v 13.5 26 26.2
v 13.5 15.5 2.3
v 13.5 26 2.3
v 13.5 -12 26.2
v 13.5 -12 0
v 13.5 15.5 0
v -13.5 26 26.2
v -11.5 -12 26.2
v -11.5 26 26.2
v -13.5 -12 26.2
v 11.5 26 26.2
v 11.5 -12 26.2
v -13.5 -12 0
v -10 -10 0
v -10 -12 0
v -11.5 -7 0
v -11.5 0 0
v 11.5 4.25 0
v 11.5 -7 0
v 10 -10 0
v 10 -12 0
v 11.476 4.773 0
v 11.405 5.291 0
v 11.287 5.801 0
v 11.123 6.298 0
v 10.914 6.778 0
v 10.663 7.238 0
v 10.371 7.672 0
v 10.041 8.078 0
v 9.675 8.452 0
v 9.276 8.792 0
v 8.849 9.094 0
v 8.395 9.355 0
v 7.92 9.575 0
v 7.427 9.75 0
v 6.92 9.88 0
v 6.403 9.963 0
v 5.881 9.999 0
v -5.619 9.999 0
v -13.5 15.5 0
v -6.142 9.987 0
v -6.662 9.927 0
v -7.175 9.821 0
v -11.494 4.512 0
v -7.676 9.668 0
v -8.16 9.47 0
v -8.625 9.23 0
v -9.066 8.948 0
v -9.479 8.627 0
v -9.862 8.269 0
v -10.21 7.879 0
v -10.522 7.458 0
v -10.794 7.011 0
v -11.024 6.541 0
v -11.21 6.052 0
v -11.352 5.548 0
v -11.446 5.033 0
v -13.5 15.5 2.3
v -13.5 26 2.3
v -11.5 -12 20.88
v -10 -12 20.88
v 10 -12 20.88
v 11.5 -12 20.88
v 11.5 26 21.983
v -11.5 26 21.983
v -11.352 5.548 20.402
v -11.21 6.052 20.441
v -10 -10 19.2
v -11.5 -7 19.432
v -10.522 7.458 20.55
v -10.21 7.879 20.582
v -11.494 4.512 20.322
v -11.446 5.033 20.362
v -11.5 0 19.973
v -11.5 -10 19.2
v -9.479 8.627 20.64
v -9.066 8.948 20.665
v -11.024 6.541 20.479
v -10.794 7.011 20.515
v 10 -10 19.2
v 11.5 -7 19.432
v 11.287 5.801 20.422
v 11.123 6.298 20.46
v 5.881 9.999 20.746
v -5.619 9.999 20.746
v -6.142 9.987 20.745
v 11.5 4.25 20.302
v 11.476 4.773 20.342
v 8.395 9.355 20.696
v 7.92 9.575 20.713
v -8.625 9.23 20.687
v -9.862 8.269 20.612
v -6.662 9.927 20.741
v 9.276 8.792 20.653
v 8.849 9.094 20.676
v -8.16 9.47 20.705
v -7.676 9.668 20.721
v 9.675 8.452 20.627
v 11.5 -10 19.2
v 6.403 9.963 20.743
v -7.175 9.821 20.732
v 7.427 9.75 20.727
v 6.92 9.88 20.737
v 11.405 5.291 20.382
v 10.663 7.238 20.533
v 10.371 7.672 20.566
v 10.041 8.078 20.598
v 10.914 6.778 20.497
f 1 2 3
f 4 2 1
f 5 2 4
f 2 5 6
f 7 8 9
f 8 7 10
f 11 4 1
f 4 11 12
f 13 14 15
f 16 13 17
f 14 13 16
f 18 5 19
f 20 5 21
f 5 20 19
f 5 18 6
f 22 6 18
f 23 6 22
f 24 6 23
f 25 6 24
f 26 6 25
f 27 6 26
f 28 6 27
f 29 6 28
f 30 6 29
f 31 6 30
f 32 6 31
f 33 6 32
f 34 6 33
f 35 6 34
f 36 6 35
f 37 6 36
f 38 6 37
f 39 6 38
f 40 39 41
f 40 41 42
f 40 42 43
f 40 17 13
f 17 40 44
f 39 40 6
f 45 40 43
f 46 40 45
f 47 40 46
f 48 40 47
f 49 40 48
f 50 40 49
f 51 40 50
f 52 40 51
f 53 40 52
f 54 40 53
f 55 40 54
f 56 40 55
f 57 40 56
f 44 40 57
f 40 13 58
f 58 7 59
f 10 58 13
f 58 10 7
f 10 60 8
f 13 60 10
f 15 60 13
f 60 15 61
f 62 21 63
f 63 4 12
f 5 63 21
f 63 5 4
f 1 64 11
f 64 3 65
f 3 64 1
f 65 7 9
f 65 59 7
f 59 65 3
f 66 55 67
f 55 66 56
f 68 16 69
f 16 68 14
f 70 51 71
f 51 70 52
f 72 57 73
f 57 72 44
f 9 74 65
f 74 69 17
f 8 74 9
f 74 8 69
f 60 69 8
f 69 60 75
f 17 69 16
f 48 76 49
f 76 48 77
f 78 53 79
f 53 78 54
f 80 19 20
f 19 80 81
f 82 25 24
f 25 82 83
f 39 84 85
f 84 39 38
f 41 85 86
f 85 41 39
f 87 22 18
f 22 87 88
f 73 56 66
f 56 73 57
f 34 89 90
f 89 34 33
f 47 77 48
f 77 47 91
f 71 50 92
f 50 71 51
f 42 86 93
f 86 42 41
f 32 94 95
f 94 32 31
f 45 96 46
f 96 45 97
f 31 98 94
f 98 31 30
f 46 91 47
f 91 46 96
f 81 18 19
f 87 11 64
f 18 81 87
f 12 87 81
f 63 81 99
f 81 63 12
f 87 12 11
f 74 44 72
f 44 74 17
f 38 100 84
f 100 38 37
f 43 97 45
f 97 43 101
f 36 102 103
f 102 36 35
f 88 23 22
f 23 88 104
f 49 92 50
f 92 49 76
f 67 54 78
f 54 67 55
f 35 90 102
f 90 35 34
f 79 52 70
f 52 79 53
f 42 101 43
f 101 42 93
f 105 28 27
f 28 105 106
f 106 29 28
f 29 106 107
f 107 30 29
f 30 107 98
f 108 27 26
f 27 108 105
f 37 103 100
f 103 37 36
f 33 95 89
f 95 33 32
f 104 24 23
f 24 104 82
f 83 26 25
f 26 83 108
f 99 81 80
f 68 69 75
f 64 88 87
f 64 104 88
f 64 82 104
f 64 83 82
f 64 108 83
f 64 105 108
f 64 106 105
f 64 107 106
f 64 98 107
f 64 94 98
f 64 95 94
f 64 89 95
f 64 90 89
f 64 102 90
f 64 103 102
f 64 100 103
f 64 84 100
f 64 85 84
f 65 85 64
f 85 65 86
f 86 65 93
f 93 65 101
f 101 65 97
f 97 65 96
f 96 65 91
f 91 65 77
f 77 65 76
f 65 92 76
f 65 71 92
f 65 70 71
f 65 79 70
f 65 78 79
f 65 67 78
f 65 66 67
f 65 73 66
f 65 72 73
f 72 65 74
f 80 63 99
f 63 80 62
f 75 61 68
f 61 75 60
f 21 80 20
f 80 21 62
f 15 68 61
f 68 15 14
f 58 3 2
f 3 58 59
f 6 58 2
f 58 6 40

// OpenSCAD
module shape(size,top) {
   hull() {
        translate([0,0,size.z/2]) {
            _radius = size.x/4;
            _diameter = 2*_radius;
            for(side = [-1,1]) {
                translate(
                    [
                        side*(size.x-3*_radius),
                        size.y/2-_radius,
                        0
                    ]
                ) {
                    $fn = 12*_radius;
                    cylinder(h=size.z,r=_radius,center=true);
                }
            }
            
            _distance_x = 1.5;
            translate([0,size.y/-4,0]) {
                cube([size.x-2*_distance_x,size.y/2,size.z],center=true);
            }
            _distance_y = 3;
            translate([0,size.y/-4+_distance_y/2,0]) {
                cube([size.x,size.y/2-_distance_y,size.z],center=true);
            }
        }
    }
    
    _dy = top.y/2+size.y/2;
   
    hull() {
        translate([0,0,2*size.z+top.z/2]) {
            cube([size.x,4*size.y,top.z],center = true);
        }
        translate([0,-size.y/2,size.z-top.z]) {
            rotate([4.4209072801,0,0]) {
                translate([0,_dy,top.z/2]) {
                    cube([size.x,size.y+top.y,top.z],center=true);
                }
            }
        }
    }
}

module centered_cube(size) {
    translate([0,0,size.z/2]) {
        cube(size,center=true);
    }
}

module adapter(thickness) {
    _main_size = [23,20,22.2];
    _secondary_size = [0,18,3];
    _distance_x = 1.5;
    difference() {
            union() {
            centered_cube(
                [
                    _main_size.x + 2*thickness,
                    _main_size.y + 2*thickness,
                    _main_size.z + 2*thickness
                ]
            );
            translate([0,_main_size.y/2-thickness,0]) {
                centered_cube(
                    [
                        _main_size.x + 2*thickness,
                        _main_size.y+_secondary_size.y - thickness,
                        _main_size.z + 2*thickness
                    ]
                );
            }
        }
        union() {
            translate([0,-thickness,0]) {
                centered_cube(
                    [
                        _main_size.x - 2*_distance_x,
                        _main_size.y,
                        _main_size.z
                    ]
                );
            }

            shape(_main_size, _secondary_size);
            
            _part = [1000,8.5,2.3];
            translate(
                [
                    0,
                    _main_size.y/2 + _secondary_size.y - 3/2*thickness - _part.y/2,
                    0
                ]
            ) {
                centered_cube(
                    [
                        _main_size.x + 2*thickness,
                        _part.y+thickness,
                        _part.z
                    ]
                );
            }
        }
    }
}

adapter(thickness = 2);
